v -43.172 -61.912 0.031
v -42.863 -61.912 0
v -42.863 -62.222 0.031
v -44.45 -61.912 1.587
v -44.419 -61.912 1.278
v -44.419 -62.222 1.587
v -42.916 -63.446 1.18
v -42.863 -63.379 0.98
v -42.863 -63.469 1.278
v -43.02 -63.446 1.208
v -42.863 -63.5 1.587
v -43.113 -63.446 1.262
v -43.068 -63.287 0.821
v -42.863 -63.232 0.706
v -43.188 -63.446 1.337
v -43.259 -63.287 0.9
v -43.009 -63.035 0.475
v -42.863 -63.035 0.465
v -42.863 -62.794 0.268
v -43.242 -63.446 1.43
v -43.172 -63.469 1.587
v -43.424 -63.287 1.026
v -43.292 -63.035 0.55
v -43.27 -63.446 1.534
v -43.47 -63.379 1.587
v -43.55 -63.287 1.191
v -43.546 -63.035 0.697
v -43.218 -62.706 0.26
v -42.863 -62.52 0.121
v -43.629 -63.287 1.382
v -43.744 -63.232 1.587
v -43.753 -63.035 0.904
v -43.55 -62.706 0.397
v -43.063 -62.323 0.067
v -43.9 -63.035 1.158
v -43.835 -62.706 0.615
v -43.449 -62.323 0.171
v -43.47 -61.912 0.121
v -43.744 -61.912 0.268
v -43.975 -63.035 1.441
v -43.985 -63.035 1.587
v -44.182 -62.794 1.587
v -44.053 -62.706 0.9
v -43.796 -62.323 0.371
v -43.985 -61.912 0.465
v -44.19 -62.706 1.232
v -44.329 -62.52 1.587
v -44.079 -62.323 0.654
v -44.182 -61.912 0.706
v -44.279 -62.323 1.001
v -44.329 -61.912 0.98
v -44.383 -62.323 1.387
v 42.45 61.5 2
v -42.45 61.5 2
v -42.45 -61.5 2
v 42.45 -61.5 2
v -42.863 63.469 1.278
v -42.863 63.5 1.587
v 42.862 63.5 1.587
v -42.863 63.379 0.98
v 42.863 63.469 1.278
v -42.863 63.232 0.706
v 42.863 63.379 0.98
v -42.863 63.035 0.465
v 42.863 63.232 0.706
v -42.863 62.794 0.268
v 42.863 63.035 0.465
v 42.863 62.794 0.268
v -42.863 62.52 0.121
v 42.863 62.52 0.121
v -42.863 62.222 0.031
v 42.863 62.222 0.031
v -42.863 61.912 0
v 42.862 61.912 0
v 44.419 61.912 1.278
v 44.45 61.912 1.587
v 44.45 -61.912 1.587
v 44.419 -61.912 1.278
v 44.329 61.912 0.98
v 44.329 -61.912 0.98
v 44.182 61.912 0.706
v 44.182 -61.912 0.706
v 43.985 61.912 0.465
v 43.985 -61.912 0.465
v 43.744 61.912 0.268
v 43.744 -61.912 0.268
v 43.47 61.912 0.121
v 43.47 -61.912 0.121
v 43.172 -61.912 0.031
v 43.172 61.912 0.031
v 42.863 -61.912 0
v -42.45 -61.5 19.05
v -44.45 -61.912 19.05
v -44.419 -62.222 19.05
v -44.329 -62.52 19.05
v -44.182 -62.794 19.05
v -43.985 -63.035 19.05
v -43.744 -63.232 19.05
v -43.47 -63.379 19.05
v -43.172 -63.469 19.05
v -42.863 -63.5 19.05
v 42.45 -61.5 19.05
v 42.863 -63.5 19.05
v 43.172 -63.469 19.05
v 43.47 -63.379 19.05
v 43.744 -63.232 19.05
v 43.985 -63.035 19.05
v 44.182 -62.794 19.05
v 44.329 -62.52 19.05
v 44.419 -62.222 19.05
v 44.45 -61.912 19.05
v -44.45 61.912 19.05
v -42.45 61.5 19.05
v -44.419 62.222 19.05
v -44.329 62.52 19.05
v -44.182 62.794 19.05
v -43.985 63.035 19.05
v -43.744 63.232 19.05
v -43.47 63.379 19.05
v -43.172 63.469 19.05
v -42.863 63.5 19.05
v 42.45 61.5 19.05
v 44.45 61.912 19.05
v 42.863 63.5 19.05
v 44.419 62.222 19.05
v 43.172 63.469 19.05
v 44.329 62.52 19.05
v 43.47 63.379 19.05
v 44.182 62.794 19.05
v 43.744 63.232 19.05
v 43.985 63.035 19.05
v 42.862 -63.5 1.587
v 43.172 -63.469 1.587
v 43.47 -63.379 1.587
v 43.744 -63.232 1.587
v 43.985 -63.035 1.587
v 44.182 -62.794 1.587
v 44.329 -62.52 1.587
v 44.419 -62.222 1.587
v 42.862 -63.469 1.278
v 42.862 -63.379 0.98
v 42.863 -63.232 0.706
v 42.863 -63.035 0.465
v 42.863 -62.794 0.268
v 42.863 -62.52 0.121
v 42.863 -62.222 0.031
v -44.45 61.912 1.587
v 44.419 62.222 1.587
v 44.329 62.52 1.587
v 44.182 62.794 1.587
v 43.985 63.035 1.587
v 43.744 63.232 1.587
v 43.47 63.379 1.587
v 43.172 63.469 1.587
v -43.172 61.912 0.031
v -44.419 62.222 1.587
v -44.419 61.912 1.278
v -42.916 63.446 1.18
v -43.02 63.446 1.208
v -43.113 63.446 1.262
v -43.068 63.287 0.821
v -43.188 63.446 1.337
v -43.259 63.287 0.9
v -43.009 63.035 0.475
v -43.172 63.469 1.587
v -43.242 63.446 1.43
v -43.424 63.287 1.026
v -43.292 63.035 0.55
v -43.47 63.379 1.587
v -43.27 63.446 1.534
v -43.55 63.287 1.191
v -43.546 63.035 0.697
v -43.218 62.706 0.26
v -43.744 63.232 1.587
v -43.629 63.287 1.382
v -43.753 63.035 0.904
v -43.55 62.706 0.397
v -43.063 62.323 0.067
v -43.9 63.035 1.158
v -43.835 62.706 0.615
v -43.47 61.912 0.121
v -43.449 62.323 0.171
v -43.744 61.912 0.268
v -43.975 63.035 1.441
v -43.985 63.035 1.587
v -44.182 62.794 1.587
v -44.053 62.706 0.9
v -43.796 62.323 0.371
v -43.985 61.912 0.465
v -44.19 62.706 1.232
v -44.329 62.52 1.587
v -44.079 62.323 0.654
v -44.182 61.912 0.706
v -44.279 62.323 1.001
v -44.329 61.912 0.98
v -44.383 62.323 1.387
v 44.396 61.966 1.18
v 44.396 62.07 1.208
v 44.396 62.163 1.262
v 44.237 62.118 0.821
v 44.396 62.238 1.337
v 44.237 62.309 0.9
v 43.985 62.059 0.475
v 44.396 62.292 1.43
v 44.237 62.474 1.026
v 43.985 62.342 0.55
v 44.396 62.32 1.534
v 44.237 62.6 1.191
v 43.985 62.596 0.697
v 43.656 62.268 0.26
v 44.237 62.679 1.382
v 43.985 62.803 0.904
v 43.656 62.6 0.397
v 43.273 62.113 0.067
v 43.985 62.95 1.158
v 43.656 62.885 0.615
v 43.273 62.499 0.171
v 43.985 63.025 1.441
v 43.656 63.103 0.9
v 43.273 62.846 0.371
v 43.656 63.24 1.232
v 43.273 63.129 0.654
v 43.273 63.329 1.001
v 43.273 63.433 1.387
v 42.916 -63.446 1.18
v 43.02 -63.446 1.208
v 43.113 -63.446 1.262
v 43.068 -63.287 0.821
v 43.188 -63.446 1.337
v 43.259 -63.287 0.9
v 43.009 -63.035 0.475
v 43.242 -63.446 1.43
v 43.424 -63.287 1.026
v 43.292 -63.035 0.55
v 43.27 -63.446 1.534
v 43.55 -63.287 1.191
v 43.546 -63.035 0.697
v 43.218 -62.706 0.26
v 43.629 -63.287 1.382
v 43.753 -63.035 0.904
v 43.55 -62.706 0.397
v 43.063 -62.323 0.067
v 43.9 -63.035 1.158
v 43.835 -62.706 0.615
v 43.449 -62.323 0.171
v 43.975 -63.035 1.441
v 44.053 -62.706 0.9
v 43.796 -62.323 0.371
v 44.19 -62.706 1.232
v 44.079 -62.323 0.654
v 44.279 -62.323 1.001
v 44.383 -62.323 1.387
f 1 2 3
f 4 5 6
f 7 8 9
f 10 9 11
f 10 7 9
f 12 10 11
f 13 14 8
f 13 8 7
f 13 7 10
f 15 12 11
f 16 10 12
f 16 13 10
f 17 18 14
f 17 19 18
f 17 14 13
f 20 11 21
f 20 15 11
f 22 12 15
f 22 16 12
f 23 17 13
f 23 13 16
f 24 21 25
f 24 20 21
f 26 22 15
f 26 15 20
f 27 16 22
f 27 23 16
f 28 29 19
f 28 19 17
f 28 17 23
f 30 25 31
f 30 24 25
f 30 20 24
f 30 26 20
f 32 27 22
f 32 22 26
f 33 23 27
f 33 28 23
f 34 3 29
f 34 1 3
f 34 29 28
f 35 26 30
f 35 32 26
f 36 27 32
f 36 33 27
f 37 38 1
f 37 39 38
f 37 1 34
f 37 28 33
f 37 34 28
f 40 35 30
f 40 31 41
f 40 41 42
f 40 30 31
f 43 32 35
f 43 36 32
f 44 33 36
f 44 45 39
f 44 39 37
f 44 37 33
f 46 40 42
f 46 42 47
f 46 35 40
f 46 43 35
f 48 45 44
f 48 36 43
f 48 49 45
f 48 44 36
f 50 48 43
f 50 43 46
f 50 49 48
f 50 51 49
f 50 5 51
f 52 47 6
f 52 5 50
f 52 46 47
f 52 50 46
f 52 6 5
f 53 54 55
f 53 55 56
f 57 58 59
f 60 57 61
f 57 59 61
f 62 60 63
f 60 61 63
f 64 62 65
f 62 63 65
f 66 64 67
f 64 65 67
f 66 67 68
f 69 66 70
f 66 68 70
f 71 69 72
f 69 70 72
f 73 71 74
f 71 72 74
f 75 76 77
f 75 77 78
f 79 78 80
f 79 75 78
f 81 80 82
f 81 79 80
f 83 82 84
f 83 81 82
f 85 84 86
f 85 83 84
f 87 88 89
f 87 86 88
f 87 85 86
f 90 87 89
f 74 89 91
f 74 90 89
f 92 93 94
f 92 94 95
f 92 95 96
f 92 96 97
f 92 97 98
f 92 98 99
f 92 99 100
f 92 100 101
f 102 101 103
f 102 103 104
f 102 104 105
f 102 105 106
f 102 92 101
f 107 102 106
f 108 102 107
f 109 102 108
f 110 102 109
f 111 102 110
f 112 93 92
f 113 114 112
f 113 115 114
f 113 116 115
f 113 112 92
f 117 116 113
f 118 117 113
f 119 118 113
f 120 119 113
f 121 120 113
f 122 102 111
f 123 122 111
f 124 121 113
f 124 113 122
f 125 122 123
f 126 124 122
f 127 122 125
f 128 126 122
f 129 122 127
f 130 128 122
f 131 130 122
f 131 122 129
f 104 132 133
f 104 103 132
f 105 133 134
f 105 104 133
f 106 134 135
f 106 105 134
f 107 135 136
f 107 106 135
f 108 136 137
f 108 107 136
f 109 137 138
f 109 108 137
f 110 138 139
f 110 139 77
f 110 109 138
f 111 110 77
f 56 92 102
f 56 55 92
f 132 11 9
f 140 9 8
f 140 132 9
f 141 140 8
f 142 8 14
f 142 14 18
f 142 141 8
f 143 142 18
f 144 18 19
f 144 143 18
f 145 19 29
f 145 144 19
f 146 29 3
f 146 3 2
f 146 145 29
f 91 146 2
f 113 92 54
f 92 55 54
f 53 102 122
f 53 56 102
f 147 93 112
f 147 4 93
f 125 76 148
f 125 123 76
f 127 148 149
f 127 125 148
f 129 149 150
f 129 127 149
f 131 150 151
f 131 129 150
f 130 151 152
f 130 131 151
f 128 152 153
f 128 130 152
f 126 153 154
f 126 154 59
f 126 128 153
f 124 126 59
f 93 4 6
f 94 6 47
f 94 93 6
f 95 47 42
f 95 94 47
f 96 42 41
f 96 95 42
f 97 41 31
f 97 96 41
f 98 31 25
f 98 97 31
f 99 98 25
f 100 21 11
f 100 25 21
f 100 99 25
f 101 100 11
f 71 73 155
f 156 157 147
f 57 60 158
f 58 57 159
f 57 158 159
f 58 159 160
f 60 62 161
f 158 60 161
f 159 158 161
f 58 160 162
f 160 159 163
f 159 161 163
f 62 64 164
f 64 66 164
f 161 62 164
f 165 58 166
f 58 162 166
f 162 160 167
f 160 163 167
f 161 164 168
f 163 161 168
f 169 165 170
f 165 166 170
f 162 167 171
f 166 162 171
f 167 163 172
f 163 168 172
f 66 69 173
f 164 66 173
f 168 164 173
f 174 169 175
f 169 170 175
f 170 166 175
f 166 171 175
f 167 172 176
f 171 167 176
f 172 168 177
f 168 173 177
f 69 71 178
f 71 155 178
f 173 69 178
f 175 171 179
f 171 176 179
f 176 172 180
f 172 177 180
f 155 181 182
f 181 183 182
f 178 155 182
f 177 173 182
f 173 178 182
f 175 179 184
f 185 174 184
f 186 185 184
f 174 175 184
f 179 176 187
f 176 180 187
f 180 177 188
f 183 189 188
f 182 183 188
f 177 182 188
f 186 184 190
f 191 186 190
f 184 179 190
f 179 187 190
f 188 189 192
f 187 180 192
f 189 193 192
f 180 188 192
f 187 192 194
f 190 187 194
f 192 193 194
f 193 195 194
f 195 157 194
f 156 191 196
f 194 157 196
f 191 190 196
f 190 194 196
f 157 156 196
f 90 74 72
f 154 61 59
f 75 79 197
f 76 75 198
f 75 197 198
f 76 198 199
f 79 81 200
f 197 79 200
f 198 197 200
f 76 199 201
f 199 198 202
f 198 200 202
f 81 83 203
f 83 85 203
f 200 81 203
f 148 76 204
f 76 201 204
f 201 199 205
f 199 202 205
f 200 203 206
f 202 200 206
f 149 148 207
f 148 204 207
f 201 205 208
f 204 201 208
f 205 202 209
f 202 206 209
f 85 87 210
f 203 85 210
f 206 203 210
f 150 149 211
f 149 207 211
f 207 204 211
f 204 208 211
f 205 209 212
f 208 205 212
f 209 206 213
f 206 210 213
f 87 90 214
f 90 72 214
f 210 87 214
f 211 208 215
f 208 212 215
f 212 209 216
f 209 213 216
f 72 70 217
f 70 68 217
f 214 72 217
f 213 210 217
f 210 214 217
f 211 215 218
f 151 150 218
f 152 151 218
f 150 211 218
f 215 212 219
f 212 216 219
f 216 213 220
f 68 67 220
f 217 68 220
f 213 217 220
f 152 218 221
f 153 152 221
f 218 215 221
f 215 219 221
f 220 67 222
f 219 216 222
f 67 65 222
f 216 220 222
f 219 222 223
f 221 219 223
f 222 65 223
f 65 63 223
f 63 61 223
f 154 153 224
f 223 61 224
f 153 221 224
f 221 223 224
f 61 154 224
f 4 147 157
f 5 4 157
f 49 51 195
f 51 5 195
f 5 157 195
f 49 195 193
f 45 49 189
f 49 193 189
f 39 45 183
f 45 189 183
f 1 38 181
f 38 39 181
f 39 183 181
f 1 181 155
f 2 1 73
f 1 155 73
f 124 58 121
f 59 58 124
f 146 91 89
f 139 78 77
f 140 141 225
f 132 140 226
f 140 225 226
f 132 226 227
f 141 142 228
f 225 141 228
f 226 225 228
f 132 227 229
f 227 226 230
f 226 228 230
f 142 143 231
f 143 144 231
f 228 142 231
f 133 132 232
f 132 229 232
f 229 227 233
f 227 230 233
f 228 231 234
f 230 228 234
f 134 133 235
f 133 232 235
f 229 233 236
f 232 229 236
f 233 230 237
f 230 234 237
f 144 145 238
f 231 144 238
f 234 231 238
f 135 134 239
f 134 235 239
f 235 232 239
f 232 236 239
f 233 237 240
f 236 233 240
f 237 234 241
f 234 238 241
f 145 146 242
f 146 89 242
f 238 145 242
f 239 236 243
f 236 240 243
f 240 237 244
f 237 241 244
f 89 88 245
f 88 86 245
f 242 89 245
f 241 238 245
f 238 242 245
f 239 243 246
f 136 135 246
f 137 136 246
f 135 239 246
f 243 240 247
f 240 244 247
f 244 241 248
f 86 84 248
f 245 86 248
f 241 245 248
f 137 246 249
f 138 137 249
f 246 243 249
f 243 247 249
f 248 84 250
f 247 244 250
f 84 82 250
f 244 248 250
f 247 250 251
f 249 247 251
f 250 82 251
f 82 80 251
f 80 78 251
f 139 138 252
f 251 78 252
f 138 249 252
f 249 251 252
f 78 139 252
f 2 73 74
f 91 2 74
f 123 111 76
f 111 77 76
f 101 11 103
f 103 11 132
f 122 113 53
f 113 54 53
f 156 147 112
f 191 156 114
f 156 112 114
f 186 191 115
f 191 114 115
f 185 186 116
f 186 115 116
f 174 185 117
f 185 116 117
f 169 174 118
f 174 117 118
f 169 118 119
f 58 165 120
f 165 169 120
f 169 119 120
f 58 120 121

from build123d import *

# Parameters (mm, degrees)
SKETCH1_W           = 88.9
SKETCH1_H           = 127
BOSS_EXTRUDE1_DEPTH = 19.05
FILLET1_R           = 1.5875
SHELL1_T            = -2


with BuildPart() as part:
    # Sketch1 → Boss-Extrude1 (new body)
    with BuildSketch(Plane.XY):
        Rectangle(SKETCH1_W, SKETCH1_H)
    extrude(amount=BOSS_EXTRUDE1_DEPTH)

    # Fillet1
    fillet1_edges = [part.edges().sort_by_distance(p)[0] for p in [
        (-44.45, 0, 0),
        (0, 63.5, 0),
        (44.45, 0, 0),
        (0, -63.5, 0),
        (-44.45, -63.5, 9.525),
        (-44.45, 63.5, 9.525),
        (44.45, 63.5, 9.525),
        (44.45, -63.5, 9.525),
    ]]
    fillet(fillet1_edges, radius=FILLET1_R)

    # Shell1
    shell1_openings = [part.faces().sort_by_distance(p)[0] for p in [
        (0, 0, 19.05),
    ]]
    offset(amount=SHELL1_T, openings=shell1_openings, kind=Kind.INTERSECTION)


solid = part.part
